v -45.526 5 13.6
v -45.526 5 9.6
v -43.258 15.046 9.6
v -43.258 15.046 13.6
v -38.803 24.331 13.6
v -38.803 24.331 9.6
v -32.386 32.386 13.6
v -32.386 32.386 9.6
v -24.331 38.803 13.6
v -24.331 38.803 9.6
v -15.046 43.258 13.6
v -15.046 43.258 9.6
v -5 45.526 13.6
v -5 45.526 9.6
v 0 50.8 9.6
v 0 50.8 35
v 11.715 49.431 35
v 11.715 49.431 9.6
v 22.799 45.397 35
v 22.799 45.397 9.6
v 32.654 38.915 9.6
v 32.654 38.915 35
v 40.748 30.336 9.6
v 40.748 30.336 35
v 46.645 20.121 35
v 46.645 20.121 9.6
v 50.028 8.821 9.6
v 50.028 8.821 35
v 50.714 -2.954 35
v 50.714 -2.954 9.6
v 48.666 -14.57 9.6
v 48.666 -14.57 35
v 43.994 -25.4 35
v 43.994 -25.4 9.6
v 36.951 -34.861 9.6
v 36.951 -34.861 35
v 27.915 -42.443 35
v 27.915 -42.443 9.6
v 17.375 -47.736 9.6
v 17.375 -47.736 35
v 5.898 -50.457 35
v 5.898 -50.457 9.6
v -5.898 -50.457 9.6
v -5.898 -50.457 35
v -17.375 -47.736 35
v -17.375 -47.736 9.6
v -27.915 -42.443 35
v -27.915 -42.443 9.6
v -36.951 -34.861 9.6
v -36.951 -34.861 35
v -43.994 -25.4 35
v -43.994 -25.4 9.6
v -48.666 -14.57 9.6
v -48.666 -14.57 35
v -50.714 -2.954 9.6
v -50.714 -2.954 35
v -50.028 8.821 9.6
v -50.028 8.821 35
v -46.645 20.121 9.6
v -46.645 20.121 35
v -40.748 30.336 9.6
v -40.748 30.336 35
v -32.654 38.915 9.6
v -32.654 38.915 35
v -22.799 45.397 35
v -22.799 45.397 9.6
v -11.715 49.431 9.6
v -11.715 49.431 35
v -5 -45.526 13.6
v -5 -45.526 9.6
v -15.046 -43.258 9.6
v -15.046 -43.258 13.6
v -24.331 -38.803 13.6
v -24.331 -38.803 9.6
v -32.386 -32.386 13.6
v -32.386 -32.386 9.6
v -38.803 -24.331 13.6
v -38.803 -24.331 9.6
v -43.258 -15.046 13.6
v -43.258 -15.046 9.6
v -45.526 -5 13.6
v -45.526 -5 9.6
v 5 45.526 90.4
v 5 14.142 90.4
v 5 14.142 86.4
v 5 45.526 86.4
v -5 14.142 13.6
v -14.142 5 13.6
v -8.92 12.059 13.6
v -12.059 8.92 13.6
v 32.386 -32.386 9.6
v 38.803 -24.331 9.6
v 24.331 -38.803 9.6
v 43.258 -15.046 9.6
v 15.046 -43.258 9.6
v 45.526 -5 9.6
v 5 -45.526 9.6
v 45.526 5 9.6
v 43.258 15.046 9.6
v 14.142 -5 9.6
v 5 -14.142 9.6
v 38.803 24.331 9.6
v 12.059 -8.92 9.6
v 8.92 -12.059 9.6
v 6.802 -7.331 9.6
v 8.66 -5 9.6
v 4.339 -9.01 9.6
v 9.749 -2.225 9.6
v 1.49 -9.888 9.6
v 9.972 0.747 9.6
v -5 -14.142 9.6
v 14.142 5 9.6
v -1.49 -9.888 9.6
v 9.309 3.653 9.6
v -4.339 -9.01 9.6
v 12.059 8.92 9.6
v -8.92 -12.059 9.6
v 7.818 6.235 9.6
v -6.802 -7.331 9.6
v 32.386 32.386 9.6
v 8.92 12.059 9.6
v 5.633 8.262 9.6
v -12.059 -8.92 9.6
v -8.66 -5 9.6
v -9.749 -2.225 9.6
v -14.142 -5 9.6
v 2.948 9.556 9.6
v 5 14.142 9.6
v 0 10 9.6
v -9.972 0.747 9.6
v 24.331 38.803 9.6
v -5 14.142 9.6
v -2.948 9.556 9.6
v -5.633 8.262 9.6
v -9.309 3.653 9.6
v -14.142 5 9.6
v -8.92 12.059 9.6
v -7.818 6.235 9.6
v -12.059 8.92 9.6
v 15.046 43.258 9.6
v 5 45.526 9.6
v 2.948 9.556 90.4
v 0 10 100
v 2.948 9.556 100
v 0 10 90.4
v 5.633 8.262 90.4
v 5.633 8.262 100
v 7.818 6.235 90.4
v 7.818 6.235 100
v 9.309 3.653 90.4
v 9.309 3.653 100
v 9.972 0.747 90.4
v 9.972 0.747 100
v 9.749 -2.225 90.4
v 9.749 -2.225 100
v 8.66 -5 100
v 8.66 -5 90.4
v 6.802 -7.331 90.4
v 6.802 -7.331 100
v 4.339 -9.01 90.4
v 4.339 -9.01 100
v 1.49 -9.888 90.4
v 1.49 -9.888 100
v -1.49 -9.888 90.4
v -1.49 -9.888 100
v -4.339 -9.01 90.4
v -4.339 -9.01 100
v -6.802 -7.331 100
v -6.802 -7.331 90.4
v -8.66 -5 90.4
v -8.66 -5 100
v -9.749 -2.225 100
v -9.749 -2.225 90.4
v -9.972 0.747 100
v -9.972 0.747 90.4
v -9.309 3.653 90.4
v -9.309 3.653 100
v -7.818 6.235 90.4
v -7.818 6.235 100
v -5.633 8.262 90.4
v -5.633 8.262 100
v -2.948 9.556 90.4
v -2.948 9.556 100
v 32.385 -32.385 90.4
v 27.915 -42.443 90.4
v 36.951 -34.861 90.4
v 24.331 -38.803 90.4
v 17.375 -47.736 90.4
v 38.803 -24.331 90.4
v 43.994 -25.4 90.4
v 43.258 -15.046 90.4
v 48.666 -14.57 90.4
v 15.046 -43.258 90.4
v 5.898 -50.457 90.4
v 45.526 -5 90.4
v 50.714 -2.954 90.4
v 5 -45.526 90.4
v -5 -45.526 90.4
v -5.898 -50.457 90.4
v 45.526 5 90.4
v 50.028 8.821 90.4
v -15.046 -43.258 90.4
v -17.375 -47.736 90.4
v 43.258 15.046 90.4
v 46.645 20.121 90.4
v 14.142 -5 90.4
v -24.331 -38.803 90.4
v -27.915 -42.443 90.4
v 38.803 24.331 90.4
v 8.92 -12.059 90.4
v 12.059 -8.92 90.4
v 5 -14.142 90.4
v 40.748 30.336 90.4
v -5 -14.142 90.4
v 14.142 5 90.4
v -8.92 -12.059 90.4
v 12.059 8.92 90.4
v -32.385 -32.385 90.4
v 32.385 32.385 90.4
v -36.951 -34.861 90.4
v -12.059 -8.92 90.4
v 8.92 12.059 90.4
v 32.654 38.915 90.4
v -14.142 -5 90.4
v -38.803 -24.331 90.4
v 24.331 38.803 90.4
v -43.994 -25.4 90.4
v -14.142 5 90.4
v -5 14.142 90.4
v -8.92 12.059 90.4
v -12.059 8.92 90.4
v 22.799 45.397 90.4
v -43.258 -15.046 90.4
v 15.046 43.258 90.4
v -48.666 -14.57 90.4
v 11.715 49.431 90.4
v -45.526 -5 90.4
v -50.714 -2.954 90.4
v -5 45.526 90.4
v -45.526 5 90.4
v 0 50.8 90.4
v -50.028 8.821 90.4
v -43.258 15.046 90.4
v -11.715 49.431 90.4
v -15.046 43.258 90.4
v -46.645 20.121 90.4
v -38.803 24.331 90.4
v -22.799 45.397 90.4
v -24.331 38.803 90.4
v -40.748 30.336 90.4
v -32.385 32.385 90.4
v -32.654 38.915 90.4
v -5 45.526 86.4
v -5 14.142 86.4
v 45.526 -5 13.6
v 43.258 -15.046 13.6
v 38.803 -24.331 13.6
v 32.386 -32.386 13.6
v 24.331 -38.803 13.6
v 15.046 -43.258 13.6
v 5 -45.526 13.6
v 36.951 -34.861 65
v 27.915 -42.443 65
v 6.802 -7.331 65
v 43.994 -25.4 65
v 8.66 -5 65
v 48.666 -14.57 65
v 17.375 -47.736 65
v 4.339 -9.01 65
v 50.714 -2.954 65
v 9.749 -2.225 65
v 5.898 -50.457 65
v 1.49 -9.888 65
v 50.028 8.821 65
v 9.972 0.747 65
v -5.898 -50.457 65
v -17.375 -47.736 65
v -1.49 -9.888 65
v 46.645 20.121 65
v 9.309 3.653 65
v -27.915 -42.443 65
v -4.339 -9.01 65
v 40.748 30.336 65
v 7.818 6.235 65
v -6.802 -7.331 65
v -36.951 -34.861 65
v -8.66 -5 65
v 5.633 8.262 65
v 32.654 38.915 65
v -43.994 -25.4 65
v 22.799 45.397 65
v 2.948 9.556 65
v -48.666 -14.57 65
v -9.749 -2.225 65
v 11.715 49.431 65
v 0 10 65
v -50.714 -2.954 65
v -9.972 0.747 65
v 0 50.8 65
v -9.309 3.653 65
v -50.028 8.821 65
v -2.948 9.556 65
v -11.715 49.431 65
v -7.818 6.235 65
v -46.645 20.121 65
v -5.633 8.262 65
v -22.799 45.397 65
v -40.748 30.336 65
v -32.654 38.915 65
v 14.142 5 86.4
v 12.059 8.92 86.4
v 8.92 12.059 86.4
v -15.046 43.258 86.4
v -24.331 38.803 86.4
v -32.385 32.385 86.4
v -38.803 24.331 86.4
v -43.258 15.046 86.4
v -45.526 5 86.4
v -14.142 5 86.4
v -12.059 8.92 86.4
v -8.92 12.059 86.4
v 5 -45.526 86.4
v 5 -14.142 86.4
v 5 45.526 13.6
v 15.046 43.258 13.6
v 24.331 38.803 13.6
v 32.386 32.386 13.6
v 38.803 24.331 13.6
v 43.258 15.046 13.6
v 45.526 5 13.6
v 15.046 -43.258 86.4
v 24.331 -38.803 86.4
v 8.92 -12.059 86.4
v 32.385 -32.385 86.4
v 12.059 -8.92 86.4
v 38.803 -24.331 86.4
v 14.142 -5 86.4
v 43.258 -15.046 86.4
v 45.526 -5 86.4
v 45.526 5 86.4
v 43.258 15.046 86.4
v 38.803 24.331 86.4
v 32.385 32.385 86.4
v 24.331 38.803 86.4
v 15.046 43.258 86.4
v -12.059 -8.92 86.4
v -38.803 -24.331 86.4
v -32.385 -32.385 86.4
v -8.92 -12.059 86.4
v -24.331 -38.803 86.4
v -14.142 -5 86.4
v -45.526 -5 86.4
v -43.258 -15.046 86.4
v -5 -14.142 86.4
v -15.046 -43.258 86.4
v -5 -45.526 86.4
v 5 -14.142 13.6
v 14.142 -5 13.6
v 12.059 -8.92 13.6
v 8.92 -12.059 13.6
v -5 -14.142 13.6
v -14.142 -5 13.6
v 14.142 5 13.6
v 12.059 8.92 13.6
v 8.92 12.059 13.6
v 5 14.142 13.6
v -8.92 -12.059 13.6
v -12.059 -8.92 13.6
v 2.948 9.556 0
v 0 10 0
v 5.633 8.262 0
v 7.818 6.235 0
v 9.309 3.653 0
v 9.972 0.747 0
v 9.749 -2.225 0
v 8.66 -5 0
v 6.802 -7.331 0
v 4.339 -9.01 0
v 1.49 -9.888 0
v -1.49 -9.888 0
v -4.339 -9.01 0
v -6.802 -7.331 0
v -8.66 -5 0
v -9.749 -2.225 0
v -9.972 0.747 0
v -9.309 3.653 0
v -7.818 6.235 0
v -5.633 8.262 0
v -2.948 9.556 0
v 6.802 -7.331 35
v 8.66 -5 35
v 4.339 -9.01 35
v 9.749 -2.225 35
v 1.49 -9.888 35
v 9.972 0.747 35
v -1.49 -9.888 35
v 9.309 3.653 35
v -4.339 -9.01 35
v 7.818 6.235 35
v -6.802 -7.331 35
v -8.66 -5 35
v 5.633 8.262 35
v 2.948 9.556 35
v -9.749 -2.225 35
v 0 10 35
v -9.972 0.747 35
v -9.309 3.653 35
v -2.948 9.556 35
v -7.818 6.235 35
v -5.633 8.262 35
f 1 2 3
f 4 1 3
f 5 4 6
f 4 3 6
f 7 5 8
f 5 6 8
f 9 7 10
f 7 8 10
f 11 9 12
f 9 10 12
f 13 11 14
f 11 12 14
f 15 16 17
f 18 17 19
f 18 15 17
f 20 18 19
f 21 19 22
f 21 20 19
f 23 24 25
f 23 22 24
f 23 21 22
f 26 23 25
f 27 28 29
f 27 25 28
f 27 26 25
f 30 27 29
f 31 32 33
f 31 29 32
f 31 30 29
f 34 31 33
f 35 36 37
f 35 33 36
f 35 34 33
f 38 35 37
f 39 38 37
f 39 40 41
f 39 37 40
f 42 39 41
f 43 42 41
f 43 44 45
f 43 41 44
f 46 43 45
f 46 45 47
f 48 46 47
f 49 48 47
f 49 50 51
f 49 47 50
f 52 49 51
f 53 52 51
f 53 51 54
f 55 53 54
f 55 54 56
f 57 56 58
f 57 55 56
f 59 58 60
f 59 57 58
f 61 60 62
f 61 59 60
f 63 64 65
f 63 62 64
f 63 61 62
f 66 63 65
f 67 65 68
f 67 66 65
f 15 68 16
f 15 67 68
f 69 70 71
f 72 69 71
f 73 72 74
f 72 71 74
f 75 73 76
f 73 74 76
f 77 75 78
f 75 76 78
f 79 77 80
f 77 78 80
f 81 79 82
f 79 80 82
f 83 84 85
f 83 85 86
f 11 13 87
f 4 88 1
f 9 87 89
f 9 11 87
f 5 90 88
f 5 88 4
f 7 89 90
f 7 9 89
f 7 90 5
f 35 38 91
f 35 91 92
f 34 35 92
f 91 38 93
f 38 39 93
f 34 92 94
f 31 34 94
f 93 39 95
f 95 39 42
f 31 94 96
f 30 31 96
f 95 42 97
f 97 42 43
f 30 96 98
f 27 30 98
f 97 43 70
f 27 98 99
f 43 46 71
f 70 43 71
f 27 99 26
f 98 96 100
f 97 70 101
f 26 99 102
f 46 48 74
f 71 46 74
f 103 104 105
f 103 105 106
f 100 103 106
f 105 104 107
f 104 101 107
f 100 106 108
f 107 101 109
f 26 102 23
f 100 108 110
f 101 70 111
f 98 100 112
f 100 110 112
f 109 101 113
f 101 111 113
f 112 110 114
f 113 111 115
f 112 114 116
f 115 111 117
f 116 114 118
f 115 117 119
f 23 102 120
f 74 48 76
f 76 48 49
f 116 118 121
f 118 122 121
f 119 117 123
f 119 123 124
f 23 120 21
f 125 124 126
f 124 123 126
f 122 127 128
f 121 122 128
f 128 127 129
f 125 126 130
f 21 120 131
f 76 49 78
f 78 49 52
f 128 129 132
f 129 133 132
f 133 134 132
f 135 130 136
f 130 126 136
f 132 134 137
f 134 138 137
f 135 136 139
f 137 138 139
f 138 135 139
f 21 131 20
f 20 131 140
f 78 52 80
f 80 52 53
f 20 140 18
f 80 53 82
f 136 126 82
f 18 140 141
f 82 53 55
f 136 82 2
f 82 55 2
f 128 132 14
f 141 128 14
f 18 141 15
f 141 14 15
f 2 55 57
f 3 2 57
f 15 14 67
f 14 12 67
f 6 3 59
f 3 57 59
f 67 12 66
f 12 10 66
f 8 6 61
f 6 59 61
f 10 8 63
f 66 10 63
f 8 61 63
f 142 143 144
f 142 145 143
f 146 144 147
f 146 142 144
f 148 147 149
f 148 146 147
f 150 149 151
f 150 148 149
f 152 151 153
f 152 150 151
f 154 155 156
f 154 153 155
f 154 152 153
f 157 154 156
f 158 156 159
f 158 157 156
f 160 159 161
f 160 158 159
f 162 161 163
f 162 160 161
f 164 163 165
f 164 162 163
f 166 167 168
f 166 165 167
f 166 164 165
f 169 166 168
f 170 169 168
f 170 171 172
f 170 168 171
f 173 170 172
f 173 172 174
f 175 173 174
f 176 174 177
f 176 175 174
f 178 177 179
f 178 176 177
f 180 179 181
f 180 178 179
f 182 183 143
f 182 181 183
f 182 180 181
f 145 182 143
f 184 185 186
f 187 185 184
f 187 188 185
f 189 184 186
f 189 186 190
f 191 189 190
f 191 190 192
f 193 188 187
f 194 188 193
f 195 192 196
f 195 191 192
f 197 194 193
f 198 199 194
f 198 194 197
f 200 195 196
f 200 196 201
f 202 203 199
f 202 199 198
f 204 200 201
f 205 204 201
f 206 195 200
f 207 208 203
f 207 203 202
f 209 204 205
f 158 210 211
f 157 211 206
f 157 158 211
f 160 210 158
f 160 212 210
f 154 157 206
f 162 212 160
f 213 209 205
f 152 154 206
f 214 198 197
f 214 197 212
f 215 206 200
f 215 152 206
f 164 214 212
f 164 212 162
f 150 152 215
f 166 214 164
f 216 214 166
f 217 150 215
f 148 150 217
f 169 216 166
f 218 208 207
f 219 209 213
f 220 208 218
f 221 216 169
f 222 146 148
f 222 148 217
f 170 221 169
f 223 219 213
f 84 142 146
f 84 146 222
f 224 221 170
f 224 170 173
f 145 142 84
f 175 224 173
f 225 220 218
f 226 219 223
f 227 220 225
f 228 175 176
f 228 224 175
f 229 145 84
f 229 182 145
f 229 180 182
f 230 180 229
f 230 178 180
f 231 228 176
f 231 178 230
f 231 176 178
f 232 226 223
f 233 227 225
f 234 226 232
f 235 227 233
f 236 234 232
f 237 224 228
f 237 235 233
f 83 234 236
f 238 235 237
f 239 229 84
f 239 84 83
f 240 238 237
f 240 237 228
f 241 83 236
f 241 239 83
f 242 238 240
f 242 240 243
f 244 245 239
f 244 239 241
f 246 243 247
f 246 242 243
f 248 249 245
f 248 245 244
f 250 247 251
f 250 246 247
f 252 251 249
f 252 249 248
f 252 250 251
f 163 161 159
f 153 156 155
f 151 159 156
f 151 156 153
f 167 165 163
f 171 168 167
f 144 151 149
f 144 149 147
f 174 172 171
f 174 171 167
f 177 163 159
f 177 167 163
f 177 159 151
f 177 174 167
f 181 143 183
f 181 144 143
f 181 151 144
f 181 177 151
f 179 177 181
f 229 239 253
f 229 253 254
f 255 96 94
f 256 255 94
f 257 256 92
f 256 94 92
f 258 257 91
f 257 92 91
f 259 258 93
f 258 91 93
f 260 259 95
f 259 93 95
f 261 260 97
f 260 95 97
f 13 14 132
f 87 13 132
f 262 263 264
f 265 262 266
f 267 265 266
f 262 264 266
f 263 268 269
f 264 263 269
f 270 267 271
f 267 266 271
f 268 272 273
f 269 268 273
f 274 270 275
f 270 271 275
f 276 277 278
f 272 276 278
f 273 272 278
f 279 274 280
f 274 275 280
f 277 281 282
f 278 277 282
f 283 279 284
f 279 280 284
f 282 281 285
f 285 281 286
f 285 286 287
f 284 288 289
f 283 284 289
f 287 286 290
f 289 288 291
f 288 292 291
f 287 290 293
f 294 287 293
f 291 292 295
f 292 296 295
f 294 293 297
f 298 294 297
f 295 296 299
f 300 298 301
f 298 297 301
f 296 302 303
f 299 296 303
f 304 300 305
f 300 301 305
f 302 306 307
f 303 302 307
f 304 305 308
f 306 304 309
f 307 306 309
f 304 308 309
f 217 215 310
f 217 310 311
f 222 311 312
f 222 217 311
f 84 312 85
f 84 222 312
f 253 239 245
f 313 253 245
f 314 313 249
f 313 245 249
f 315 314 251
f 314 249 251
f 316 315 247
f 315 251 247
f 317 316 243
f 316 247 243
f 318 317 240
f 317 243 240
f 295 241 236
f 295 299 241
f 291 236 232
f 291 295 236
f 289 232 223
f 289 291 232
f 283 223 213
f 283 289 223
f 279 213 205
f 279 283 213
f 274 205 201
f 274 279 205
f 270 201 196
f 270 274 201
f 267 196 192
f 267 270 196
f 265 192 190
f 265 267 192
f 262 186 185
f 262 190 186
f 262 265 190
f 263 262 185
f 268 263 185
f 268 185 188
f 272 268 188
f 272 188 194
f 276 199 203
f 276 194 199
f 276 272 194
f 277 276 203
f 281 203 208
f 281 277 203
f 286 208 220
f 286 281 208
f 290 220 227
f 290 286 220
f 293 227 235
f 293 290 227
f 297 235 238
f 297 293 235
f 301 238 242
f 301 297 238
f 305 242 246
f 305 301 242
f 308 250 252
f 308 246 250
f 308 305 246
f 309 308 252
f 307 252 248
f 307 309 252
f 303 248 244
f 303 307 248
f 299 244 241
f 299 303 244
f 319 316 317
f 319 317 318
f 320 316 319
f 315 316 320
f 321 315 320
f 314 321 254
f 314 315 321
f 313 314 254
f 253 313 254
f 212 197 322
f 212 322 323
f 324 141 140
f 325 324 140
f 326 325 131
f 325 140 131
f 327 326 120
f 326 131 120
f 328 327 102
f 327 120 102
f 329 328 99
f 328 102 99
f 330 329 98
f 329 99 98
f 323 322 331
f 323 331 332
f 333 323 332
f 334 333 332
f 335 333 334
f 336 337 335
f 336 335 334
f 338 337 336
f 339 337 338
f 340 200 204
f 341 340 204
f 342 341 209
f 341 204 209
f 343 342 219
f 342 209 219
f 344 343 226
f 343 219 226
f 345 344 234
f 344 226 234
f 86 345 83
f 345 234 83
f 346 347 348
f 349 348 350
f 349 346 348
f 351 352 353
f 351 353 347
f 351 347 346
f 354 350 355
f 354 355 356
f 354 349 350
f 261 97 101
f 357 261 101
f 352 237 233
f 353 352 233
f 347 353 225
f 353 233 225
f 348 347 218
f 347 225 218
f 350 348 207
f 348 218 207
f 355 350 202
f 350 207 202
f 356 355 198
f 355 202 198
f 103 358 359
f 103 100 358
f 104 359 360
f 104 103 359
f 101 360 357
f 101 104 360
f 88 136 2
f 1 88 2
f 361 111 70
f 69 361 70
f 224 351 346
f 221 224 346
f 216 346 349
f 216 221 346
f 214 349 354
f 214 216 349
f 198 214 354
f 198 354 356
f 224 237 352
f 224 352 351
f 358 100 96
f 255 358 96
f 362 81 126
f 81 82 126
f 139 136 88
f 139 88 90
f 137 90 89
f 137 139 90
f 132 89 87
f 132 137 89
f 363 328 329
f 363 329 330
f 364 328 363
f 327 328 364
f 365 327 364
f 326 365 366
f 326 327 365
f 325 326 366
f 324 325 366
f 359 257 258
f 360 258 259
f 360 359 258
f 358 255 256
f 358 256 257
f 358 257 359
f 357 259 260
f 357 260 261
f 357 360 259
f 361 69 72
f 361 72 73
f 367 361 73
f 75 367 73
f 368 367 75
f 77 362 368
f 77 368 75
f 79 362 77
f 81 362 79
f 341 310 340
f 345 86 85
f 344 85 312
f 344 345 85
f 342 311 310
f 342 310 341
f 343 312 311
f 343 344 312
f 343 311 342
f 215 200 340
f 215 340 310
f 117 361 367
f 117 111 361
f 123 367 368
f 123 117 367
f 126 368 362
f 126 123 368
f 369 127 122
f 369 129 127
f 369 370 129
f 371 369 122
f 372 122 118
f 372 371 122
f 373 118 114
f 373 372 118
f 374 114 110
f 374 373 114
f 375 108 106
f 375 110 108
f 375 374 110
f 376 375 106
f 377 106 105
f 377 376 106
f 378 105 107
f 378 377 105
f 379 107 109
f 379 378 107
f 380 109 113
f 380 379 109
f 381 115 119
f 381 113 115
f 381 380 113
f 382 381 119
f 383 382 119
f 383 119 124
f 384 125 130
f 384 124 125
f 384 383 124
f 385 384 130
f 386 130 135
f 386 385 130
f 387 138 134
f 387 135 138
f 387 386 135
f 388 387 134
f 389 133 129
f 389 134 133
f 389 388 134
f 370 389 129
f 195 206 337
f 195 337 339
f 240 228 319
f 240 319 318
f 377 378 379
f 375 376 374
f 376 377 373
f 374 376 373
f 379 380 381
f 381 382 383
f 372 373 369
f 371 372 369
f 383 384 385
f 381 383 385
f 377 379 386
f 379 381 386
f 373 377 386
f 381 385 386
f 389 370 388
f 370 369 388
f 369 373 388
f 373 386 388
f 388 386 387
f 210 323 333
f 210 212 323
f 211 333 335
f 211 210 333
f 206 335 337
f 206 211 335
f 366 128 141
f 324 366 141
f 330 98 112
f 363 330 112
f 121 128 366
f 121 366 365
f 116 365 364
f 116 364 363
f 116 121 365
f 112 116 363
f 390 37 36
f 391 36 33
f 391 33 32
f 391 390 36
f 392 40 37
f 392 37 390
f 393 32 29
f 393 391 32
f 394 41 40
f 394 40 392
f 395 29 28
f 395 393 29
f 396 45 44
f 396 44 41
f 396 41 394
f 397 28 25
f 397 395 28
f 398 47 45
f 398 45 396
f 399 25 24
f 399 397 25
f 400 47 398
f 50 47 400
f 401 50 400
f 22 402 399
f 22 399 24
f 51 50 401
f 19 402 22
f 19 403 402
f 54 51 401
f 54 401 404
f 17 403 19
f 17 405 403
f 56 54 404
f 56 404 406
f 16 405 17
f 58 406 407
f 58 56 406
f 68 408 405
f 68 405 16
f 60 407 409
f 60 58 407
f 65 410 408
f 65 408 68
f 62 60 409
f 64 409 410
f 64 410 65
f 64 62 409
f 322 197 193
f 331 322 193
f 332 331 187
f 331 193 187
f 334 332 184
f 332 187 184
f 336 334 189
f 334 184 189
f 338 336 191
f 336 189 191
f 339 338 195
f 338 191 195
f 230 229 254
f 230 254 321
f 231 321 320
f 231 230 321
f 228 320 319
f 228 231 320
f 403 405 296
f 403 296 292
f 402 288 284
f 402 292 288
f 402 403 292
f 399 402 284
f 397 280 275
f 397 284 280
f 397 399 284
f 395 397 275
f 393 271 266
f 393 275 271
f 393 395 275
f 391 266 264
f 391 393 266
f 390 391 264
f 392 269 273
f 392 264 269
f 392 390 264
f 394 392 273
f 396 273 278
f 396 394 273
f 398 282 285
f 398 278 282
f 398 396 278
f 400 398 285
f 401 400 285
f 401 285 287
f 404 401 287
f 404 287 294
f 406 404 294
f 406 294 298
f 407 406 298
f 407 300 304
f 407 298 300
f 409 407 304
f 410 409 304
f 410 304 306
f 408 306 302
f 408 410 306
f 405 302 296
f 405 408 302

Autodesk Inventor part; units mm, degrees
ref_plane "YZ Plane" through (0, 0, 0) normal (1, 0, 0) x (0, 1, 0)
ref_plane "XZ Plane" through (0, 0, 0) normal (0, 1, 0) x (-1, 0, 0)
ref_plane "XY Plane" through (0, 0, 0) normal (0, 0, 1) x (1, 0, 0)
sketch "Esboço1" plane through (0, 0, 0) normal (1, 0, 0) x (0, 1, 0)
  line L0 (0, 0) -> (0, 100)
  line L1 (0, 100) -> (10, 100)
  line L2 (10, 100) -> (10, 90.4)
  line L3 (10, 90.4) -> (50.8, 90.4)
  line L4 (50.8, 90.4) -> (50.8, 65)
  line L5 (50.8, 65) -> (10, 65)
  line L6 (10, 65) -> (10, 35)
  line L7 (10, 35) -> (50.8, 35)
  line L8 (50.8, 35) -> (50.8, 9.6)
  line L9 (50.8, 9.6) -> (10, 9.6)
  line L10 (10, 9.6) -> (10, 0)
  line L11 (10, 0) -> (0, 0)
  line L12 (0, 50) -> (10, 50)
  dimension "d0" = 10
  dimension "d1" = 100
  dimension "d2" = 25.4
  dimension "d3" = 25.4
  dimension "d4" = 15
  dimension "d5" = 15
  dimension "d6" = 50.8
revolve "Revolução1" add sketch "Esboço1" angle 360 about axis through (0, 0, 0) along (0, 0, 1)
thread "Rosca1" size "M1060x8" class "6g" standard "ANSI Metric M Profile" full length
thread "Rosca2" size "M105x6" class "6g" standard "ANSI Metric M Profile" full length
sketch "Esboço2" plane through (0, 0, 90.4) normal (0, 0, 1) x (1, 0, 0)
  circle A0 centre (0, 0) radius 10 projected
  circle A1 centre (0, 0) radius 45.8
  circle A2 centre (0, 0) radius 50.8 projected
  circle A3 centre (0, 0) radius 15
  line L0 (50.5533, 5) -> (-50.5533, 5)
  line L1 (-50.5533, 5) -> (-50.5533, -5)
  line L2 (-50.5533, -5) -> (50.5533, -5)
  line L3 (50.5533, -5) -> (50.5533, 5)
  line L4 (50.5533, 5) -> (-50.5533, -5) construction
  line L5 (-50.5533, 5) -> (50.5533, -5) construction
  line L6 (5, 50.5533) -> (-5, 50.5533)
  line L7 (-5, 50.5533) -> (-5, -50.5533)
  line L8 (-5, -50.5533) -> (5, -50.5533)
  line L9 (5, -50.5533) -> (5, 50.5533)
  line L10 (5, 50.5533) -> (-5, -50.5533) construction
  line L11 (-5, 50.5533) -> (5, -50.5533) construction
  point P0 (5, 45.5263)
  point P1 (5, 14.1421)
  point P2 (14.1421, 5)
  point P3 (45.5263, 5)
  point P4 (5, -14.1421)
  point P5 (5, -45.5263)
  point P6 (45.5263, -5)
  point P7 (14.1421, -5)
  point P8 (-5, 14.1421)
  point P9 (-5, 45.5263)
  point P10 (-45.5263, 5)
  point P11 (-14.1421, 5)
  point P12 (-5, -45.5263)
  point P13 (-5, -14.1421)
  point P14 (-14.1421, -5)
  point P15 (-45.5263, -5)
  dimension "d12" = 5
  dimension "d13" = 5
  dimension "d14" = 10
  dimension "d15" = 10
extrude "Extrusão1" cut sketch "Esboço2" against normal blind 4 contours A3 L9 A1 L0 | L2 A1 L9 A3 | A3 L0 A1 L7 | L7 A1 L2 A3
sketch "Esboço3" plane through (0, 0, 9.6) normal (0, 0, -1) x (-1, 0, 0)
  circle A0 centre (0, 0) radius 10 projected
  arc A1 (45.5263, 5) -> (5, 45.5263) centre (0, 0) ccw projected
  line L0 (14.1421, 5) -> (45.5263, 5) projected
  arc A2 (14.1421, 5) -> (5, 14.1421) centre (0, 0) ccw projected
  line L1 (5, 45.5263) -> (5, 14.1421) projected
  arc A3 (5, -14.1421) -> (14.1421, -5) centre (0, 0) ccw projected
  line L2 (45.5263, -5) -> (14.1421, -5) projected
  arc A4 (5, -45.5263) -> (45.5263, -5) centre (0, 0) ccw projected
  line L3 (5, -14.1421) -> (5, -45.5263) projected
  arc A5 (-45.5263, -5) -> (-5, -45.5263) centre (0, 0) ccw projected
  line L4 (-14.1421, -5) -> (-45.5263, -5) projected
  arc A6 (-14.1421, -5) -> (-5, -14.1421) centre (0, 0) ccw projected
  line L5 (-5, -45.5263) -> (-5, -14.1421) projected
  arc A7 (-5, 14.1421) -> (-14.1421, 5) centre (0, 0) ccw projected
  line L6 (-45.5263, 5) -> (-14.1421, 5) projected
  arc A8 (-5, 45.5263) -> (-45.5263, 5) centre (0, 0) ccw projected
  line L7 (-5, 14.1421) -> (-5, 45.5263) projected
extrude "Extrusão2" cut sketch "Esboço3" against normal blind 4 contours L0 A2 L1 A1 | A3 L2 A4 L3 | L4 A6 L5 A5 | A7 L6 A8 L7
equation "\"d3\" = d2"
equation "\"d5\" = d4"
equation "\"d15\" = d14"
properties part number "Coletor - Hand"
